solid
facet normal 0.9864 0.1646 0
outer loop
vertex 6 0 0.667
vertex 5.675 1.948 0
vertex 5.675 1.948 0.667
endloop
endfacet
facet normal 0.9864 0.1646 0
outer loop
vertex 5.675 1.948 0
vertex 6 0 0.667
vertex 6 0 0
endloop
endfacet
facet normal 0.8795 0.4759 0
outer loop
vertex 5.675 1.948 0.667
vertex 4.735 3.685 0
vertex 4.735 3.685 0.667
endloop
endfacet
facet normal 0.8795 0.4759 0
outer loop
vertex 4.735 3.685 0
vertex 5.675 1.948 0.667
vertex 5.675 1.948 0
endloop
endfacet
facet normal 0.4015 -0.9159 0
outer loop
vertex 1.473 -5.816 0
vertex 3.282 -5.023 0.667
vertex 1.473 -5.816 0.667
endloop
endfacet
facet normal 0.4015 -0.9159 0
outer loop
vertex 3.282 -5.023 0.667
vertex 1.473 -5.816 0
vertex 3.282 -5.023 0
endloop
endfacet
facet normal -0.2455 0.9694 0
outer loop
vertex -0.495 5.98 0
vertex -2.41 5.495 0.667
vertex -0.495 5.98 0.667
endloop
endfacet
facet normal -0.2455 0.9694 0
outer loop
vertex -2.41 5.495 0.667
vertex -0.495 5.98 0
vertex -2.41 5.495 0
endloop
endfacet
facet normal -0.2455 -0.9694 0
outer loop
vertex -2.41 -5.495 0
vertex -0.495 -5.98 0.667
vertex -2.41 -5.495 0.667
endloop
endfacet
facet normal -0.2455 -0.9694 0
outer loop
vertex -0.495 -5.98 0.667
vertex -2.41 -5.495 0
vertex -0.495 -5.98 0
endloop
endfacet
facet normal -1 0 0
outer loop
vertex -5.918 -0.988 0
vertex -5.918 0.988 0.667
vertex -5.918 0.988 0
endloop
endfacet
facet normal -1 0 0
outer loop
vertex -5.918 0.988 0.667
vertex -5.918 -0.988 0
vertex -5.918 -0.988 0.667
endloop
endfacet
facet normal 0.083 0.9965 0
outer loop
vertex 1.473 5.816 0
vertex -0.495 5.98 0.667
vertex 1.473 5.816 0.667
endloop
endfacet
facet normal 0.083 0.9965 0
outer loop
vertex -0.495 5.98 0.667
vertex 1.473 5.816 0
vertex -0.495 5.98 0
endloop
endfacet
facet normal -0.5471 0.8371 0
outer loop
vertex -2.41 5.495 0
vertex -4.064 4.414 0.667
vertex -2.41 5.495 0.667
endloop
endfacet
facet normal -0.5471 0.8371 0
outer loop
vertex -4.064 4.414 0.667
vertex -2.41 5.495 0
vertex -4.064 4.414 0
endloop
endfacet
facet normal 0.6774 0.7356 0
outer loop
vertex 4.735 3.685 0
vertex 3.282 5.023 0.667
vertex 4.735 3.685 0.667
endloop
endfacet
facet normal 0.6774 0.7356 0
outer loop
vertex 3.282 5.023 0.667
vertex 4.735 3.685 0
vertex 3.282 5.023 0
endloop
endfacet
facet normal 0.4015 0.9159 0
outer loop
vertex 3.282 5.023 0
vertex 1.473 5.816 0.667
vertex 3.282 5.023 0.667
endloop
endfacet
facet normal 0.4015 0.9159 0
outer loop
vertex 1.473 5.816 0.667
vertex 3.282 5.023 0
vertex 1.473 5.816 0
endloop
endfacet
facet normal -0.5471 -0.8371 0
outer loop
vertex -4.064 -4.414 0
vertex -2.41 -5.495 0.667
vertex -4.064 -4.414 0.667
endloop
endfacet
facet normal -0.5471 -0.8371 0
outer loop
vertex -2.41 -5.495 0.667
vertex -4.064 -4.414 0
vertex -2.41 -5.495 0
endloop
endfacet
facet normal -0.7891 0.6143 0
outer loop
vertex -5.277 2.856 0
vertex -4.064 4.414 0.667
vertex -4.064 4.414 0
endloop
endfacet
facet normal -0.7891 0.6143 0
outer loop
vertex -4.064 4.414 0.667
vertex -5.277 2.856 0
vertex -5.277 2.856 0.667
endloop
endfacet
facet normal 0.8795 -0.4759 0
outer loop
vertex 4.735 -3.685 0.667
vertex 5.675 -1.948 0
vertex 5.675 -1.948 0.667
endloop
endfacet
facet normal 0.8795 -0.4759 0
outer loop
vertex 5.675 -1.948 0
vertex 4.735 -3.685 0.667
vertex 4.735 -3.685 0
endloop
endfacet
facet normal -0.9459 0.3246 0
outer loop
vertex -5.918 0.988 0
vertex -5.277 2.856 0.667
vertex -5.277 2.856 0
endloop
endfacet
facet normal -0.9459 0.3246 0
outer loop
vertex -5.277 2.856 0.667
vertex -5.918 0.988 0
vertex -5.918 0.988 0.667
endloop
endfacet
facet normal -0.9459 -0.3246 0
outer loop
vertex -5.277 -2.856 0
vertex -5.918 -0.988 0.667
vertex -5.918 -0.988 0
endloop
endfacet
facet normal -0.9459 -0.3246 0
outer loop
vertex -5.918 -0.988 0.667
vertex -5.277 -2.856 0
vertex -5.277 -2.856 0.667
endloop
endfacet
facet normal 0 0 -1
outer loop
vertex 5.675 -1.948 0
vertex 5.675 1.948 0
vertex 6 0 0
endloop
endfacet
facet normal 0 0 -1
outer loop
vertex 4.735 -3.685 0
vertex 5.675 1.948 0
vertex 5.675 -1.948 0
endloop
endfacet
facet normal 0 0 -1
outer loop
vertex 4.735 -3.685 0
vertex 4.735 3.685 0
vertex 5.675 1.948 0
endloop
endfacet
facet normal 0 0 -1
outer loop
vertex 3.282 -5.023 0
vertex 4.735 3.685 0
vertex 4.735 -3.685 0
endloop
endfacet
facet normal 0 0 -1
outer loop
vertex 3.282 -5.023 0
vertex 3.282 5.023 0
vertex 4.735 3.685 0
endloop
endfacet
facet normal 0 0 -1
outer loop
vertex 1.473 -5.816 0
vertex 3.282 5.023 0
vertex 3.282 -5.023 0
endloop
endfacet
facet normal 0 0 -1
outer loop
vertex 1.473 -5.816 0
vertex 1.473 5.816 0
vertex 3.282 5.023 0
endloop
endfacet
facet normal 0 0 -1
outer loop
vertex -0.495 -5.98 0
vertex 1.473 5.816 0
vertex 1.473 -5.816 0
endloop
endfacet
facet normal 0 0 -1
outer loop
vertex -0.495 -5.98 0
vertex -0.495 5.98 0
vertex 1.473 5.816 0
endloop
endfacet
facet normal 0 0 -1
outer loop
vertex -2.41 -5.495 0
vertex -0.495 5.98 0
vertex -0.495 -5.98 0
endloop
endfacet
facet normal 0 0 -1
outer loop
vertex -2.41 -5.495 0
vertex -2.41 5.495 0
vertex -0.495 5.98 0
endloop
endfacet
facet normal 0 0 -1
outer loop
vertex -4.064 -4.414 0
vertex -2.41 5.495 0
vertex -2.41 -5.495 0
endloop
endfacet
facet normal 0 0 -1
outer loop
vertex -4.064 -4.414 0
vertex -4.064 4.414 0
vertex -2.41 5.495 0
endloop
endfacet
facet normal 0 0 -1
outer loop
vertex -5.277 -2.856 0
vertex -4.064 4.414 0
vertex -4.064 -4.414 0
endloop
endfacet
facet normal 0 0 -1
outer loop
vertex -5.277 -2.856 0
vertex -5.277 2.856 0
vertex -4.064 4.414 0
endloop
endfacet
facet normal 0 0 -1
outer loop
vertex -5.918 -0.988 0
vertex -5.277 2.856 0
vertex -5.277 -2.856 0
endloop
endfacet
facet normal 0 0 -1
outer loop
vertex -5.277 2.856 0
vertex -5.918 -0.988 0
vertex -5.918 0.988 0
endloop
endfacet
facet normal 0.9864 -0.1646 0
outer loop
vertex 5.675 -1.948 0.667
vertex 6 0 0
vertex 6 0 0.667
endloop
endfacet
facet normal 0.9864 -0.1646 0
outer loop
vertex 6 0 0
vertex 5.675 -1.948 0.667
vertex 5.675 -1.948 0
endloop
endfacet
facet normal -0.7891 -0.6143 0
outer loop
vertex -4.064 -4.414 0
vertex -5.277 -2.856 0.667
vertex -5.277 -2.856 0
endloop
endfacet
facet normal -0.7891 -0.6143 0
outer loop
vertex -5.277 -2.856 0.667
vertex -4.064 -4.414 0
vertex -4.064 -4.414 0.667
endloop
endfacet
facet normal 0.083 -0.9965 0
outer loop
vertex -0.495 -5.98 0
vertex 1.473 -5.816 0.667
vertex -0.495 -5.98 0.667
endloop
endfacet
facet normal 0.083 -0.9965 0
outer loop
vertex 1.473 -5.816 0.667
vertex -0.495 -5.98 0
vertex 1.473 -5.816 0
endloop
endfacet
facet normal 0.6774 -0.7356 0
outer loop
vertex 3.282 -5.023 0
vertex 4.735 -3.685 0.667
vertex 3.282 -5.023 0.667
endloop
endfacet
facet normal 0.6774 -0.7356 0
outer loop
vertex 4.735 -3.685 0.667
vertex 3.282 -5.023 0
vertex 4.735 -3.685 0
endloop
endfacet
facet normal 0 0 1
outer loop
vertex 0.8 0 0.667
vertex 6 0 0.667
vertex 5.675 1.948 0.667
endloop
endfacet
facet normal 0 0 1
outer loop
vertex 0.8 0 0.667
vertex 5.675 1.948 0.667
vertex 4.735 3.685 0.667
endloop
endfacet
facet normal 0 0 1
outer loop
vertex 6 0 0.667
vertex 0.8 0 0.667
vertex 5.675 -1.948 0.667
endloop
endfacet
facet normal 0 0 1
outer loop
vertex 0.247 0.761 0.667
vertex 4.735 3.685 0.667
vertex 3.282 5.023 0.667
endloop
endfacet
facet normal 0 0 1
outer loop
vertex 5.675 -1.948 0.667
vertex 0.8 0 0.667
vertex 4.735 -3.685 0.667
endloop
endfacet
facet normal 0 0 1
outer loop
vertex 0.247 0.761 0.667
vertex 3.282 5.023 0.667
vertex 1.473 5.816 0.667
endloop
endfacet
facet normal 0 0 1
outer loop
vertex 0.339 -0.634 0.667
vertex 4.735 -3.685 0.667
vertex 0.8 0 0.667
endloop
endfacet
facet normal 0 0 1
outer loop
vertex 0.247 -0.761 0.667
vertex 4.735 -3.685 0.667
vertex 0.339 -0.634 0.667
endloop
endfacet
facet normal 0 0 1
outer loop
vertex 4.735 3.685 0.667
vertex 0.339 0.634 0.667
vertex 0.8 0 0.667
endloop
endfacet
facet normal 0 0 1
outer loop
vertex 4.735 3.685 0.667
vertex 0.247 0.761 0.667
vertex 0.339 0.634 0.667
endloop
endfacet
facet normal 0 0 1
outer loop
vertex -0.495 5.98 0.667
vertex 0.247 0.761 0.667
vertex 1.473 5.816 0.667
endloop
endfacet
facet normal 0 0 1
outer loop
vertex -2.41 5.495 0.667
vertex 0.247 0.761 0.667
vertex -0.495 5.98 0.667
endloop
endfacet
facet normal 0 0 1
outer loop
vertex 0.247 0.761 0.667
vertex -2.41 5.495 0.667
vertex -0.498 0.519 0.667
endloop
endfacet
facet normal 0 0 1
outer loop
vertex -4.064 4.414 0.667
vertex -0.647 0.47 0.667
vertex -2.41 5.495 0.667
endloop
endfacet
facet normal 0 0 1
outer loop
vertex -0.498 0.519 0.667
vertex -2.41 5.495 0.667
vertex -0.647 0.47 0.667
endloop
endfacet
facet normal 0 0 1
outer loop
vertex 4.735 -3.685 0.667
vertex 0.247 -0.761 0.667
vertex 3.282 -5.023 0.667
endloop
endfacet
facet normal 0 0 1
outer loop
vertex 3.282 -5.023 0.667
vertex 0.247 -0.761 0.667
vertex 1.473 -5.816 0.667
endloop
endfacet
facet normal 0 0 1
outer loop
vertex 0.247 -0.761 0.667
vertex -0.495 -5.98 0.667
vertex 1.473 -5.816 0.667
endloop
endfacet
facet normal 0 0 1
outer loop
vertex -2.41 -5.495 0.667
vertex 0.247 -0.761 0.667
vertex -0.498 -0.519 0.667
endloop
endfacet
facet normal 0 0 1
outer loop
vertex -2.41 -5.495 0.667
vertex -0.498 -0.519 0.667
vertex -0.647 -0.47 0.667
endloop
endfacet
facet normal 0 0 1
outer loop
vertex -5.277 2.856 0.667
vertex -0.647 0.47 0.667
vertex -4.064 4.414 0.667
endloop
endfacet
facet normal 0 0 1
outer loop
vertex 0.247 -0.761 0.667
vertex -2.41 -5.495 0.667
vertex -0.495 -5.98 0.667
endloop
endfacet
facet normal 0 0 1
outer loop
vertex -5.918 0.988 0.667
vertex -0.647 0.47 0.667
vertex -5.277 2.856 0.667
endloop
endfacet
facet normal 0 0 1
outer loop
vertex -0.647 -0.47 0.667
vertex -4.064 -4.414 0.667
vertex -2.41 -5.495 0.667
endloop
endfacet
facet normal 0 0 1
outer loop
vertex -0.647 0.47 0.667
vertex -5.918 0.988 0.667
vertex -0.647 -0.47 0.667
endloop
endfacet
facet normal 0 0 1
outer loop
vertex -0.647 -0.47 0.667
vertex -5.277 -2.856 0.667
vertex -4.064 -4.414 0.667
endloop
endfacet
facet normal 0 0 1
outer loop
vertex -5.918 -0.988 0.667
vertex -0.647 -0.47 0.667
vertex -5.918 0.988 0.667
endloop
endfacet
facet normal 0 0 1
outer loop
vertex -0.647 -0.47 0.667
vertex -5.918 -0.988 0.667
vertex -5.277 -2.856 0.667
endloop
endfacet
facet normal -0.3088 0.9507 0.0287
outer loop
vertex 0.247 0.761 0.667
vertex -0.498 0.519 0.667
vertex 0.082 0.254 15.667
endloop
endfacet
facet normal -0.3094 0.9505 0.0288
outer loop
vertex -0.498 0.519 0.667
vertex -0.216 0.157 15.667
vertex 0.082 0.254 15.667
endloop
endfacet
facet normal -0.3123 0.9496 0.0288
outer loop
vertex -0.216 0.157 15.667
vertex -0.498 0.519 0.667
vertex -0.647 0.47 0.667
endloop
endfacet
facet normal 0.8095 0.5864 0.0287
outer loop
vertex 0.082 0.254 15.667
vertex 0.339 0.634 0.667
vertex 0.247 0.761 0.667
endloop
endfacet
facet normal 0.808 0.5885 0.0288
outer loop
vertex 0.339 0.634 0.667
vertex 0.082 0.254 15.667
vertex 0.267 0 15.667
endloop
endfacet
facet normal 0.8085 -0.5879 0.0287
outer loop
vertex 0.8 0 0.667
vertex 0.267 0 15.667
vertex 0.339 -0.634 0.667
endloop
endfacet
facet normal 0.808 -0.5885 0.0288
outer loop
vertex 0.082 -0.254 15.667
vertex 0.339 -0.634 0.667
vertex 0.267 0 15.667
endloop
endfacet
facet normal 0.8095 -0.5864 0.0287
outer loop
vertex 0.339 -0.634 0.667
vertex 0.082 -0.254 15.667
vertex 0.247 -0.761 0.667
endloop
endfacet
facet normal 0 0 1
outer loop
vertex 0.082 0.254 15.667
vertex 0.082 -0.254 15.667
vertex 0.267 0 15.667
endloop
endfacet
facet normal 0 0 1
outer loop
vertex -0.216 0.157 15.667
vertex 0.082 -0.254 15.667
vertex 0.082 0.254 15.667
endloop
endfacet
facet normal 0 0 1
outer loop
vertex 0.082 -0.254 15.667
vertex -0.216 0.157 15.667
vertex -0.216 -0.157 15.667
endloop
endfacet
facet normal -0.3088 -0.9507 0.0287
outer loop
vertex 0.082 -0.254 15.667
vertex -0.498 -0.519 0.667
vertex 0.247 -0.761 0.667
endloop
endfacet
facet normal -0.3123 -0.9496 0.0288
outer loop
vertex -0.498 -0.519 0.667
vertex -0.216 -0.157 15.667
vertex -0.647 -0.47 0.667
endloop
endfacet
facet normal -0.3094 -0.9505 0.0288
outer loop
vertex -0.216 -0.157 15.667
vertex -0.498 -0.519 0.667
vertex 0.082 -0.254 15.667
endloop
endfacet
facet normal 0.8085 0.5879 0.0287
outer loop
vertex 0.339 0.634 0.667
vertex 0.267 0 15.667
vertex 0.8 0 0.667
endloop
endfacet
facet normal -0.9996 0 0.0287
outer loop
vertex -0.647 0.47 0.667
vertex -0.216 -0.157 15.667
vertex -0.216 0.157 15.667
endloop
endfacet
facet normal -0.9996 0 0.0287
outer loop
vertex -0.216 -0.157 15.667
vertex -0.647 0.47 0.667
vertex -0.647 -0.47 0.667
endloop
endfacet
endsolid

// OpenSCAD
wallThick = 2;
cutterMinimum = 0.4;
baseHeight = 2;
height = 15;
flangeWidth = 6;

minkowski ()
{
  outline ();
  cylinder (r1 = wallThick / 3, r2 = cutterMinimum / 3, h = height);
};
//%cube([.5, .5, height*3], true);

flange ();

module
flange ()
{
  difference ()
  {
    minkowski ()
    {
      baseShape (baseHeight / 3);
      cylinder (r = flangeWidth, h = baseHeight / 3);
    }
    translate ([ 0, 0, -0.01 ]) baseShape (baseHeight * 1.1);
  };
}

module
outline ()
{
  difference ()
  {
    minkowski ()
    {
      baseShape (baseHeight / 3);
      cylinder (r = cutterMinimum / 3, h = baseHeight / 3);
    }
    translate ([ 0, 0, -0.01 ]) baseShape (baseHeight * 1.1);
  };
};

module
baseShape (H)
{
  linear_extrude (file = "pi.dxf", height = H);
}
